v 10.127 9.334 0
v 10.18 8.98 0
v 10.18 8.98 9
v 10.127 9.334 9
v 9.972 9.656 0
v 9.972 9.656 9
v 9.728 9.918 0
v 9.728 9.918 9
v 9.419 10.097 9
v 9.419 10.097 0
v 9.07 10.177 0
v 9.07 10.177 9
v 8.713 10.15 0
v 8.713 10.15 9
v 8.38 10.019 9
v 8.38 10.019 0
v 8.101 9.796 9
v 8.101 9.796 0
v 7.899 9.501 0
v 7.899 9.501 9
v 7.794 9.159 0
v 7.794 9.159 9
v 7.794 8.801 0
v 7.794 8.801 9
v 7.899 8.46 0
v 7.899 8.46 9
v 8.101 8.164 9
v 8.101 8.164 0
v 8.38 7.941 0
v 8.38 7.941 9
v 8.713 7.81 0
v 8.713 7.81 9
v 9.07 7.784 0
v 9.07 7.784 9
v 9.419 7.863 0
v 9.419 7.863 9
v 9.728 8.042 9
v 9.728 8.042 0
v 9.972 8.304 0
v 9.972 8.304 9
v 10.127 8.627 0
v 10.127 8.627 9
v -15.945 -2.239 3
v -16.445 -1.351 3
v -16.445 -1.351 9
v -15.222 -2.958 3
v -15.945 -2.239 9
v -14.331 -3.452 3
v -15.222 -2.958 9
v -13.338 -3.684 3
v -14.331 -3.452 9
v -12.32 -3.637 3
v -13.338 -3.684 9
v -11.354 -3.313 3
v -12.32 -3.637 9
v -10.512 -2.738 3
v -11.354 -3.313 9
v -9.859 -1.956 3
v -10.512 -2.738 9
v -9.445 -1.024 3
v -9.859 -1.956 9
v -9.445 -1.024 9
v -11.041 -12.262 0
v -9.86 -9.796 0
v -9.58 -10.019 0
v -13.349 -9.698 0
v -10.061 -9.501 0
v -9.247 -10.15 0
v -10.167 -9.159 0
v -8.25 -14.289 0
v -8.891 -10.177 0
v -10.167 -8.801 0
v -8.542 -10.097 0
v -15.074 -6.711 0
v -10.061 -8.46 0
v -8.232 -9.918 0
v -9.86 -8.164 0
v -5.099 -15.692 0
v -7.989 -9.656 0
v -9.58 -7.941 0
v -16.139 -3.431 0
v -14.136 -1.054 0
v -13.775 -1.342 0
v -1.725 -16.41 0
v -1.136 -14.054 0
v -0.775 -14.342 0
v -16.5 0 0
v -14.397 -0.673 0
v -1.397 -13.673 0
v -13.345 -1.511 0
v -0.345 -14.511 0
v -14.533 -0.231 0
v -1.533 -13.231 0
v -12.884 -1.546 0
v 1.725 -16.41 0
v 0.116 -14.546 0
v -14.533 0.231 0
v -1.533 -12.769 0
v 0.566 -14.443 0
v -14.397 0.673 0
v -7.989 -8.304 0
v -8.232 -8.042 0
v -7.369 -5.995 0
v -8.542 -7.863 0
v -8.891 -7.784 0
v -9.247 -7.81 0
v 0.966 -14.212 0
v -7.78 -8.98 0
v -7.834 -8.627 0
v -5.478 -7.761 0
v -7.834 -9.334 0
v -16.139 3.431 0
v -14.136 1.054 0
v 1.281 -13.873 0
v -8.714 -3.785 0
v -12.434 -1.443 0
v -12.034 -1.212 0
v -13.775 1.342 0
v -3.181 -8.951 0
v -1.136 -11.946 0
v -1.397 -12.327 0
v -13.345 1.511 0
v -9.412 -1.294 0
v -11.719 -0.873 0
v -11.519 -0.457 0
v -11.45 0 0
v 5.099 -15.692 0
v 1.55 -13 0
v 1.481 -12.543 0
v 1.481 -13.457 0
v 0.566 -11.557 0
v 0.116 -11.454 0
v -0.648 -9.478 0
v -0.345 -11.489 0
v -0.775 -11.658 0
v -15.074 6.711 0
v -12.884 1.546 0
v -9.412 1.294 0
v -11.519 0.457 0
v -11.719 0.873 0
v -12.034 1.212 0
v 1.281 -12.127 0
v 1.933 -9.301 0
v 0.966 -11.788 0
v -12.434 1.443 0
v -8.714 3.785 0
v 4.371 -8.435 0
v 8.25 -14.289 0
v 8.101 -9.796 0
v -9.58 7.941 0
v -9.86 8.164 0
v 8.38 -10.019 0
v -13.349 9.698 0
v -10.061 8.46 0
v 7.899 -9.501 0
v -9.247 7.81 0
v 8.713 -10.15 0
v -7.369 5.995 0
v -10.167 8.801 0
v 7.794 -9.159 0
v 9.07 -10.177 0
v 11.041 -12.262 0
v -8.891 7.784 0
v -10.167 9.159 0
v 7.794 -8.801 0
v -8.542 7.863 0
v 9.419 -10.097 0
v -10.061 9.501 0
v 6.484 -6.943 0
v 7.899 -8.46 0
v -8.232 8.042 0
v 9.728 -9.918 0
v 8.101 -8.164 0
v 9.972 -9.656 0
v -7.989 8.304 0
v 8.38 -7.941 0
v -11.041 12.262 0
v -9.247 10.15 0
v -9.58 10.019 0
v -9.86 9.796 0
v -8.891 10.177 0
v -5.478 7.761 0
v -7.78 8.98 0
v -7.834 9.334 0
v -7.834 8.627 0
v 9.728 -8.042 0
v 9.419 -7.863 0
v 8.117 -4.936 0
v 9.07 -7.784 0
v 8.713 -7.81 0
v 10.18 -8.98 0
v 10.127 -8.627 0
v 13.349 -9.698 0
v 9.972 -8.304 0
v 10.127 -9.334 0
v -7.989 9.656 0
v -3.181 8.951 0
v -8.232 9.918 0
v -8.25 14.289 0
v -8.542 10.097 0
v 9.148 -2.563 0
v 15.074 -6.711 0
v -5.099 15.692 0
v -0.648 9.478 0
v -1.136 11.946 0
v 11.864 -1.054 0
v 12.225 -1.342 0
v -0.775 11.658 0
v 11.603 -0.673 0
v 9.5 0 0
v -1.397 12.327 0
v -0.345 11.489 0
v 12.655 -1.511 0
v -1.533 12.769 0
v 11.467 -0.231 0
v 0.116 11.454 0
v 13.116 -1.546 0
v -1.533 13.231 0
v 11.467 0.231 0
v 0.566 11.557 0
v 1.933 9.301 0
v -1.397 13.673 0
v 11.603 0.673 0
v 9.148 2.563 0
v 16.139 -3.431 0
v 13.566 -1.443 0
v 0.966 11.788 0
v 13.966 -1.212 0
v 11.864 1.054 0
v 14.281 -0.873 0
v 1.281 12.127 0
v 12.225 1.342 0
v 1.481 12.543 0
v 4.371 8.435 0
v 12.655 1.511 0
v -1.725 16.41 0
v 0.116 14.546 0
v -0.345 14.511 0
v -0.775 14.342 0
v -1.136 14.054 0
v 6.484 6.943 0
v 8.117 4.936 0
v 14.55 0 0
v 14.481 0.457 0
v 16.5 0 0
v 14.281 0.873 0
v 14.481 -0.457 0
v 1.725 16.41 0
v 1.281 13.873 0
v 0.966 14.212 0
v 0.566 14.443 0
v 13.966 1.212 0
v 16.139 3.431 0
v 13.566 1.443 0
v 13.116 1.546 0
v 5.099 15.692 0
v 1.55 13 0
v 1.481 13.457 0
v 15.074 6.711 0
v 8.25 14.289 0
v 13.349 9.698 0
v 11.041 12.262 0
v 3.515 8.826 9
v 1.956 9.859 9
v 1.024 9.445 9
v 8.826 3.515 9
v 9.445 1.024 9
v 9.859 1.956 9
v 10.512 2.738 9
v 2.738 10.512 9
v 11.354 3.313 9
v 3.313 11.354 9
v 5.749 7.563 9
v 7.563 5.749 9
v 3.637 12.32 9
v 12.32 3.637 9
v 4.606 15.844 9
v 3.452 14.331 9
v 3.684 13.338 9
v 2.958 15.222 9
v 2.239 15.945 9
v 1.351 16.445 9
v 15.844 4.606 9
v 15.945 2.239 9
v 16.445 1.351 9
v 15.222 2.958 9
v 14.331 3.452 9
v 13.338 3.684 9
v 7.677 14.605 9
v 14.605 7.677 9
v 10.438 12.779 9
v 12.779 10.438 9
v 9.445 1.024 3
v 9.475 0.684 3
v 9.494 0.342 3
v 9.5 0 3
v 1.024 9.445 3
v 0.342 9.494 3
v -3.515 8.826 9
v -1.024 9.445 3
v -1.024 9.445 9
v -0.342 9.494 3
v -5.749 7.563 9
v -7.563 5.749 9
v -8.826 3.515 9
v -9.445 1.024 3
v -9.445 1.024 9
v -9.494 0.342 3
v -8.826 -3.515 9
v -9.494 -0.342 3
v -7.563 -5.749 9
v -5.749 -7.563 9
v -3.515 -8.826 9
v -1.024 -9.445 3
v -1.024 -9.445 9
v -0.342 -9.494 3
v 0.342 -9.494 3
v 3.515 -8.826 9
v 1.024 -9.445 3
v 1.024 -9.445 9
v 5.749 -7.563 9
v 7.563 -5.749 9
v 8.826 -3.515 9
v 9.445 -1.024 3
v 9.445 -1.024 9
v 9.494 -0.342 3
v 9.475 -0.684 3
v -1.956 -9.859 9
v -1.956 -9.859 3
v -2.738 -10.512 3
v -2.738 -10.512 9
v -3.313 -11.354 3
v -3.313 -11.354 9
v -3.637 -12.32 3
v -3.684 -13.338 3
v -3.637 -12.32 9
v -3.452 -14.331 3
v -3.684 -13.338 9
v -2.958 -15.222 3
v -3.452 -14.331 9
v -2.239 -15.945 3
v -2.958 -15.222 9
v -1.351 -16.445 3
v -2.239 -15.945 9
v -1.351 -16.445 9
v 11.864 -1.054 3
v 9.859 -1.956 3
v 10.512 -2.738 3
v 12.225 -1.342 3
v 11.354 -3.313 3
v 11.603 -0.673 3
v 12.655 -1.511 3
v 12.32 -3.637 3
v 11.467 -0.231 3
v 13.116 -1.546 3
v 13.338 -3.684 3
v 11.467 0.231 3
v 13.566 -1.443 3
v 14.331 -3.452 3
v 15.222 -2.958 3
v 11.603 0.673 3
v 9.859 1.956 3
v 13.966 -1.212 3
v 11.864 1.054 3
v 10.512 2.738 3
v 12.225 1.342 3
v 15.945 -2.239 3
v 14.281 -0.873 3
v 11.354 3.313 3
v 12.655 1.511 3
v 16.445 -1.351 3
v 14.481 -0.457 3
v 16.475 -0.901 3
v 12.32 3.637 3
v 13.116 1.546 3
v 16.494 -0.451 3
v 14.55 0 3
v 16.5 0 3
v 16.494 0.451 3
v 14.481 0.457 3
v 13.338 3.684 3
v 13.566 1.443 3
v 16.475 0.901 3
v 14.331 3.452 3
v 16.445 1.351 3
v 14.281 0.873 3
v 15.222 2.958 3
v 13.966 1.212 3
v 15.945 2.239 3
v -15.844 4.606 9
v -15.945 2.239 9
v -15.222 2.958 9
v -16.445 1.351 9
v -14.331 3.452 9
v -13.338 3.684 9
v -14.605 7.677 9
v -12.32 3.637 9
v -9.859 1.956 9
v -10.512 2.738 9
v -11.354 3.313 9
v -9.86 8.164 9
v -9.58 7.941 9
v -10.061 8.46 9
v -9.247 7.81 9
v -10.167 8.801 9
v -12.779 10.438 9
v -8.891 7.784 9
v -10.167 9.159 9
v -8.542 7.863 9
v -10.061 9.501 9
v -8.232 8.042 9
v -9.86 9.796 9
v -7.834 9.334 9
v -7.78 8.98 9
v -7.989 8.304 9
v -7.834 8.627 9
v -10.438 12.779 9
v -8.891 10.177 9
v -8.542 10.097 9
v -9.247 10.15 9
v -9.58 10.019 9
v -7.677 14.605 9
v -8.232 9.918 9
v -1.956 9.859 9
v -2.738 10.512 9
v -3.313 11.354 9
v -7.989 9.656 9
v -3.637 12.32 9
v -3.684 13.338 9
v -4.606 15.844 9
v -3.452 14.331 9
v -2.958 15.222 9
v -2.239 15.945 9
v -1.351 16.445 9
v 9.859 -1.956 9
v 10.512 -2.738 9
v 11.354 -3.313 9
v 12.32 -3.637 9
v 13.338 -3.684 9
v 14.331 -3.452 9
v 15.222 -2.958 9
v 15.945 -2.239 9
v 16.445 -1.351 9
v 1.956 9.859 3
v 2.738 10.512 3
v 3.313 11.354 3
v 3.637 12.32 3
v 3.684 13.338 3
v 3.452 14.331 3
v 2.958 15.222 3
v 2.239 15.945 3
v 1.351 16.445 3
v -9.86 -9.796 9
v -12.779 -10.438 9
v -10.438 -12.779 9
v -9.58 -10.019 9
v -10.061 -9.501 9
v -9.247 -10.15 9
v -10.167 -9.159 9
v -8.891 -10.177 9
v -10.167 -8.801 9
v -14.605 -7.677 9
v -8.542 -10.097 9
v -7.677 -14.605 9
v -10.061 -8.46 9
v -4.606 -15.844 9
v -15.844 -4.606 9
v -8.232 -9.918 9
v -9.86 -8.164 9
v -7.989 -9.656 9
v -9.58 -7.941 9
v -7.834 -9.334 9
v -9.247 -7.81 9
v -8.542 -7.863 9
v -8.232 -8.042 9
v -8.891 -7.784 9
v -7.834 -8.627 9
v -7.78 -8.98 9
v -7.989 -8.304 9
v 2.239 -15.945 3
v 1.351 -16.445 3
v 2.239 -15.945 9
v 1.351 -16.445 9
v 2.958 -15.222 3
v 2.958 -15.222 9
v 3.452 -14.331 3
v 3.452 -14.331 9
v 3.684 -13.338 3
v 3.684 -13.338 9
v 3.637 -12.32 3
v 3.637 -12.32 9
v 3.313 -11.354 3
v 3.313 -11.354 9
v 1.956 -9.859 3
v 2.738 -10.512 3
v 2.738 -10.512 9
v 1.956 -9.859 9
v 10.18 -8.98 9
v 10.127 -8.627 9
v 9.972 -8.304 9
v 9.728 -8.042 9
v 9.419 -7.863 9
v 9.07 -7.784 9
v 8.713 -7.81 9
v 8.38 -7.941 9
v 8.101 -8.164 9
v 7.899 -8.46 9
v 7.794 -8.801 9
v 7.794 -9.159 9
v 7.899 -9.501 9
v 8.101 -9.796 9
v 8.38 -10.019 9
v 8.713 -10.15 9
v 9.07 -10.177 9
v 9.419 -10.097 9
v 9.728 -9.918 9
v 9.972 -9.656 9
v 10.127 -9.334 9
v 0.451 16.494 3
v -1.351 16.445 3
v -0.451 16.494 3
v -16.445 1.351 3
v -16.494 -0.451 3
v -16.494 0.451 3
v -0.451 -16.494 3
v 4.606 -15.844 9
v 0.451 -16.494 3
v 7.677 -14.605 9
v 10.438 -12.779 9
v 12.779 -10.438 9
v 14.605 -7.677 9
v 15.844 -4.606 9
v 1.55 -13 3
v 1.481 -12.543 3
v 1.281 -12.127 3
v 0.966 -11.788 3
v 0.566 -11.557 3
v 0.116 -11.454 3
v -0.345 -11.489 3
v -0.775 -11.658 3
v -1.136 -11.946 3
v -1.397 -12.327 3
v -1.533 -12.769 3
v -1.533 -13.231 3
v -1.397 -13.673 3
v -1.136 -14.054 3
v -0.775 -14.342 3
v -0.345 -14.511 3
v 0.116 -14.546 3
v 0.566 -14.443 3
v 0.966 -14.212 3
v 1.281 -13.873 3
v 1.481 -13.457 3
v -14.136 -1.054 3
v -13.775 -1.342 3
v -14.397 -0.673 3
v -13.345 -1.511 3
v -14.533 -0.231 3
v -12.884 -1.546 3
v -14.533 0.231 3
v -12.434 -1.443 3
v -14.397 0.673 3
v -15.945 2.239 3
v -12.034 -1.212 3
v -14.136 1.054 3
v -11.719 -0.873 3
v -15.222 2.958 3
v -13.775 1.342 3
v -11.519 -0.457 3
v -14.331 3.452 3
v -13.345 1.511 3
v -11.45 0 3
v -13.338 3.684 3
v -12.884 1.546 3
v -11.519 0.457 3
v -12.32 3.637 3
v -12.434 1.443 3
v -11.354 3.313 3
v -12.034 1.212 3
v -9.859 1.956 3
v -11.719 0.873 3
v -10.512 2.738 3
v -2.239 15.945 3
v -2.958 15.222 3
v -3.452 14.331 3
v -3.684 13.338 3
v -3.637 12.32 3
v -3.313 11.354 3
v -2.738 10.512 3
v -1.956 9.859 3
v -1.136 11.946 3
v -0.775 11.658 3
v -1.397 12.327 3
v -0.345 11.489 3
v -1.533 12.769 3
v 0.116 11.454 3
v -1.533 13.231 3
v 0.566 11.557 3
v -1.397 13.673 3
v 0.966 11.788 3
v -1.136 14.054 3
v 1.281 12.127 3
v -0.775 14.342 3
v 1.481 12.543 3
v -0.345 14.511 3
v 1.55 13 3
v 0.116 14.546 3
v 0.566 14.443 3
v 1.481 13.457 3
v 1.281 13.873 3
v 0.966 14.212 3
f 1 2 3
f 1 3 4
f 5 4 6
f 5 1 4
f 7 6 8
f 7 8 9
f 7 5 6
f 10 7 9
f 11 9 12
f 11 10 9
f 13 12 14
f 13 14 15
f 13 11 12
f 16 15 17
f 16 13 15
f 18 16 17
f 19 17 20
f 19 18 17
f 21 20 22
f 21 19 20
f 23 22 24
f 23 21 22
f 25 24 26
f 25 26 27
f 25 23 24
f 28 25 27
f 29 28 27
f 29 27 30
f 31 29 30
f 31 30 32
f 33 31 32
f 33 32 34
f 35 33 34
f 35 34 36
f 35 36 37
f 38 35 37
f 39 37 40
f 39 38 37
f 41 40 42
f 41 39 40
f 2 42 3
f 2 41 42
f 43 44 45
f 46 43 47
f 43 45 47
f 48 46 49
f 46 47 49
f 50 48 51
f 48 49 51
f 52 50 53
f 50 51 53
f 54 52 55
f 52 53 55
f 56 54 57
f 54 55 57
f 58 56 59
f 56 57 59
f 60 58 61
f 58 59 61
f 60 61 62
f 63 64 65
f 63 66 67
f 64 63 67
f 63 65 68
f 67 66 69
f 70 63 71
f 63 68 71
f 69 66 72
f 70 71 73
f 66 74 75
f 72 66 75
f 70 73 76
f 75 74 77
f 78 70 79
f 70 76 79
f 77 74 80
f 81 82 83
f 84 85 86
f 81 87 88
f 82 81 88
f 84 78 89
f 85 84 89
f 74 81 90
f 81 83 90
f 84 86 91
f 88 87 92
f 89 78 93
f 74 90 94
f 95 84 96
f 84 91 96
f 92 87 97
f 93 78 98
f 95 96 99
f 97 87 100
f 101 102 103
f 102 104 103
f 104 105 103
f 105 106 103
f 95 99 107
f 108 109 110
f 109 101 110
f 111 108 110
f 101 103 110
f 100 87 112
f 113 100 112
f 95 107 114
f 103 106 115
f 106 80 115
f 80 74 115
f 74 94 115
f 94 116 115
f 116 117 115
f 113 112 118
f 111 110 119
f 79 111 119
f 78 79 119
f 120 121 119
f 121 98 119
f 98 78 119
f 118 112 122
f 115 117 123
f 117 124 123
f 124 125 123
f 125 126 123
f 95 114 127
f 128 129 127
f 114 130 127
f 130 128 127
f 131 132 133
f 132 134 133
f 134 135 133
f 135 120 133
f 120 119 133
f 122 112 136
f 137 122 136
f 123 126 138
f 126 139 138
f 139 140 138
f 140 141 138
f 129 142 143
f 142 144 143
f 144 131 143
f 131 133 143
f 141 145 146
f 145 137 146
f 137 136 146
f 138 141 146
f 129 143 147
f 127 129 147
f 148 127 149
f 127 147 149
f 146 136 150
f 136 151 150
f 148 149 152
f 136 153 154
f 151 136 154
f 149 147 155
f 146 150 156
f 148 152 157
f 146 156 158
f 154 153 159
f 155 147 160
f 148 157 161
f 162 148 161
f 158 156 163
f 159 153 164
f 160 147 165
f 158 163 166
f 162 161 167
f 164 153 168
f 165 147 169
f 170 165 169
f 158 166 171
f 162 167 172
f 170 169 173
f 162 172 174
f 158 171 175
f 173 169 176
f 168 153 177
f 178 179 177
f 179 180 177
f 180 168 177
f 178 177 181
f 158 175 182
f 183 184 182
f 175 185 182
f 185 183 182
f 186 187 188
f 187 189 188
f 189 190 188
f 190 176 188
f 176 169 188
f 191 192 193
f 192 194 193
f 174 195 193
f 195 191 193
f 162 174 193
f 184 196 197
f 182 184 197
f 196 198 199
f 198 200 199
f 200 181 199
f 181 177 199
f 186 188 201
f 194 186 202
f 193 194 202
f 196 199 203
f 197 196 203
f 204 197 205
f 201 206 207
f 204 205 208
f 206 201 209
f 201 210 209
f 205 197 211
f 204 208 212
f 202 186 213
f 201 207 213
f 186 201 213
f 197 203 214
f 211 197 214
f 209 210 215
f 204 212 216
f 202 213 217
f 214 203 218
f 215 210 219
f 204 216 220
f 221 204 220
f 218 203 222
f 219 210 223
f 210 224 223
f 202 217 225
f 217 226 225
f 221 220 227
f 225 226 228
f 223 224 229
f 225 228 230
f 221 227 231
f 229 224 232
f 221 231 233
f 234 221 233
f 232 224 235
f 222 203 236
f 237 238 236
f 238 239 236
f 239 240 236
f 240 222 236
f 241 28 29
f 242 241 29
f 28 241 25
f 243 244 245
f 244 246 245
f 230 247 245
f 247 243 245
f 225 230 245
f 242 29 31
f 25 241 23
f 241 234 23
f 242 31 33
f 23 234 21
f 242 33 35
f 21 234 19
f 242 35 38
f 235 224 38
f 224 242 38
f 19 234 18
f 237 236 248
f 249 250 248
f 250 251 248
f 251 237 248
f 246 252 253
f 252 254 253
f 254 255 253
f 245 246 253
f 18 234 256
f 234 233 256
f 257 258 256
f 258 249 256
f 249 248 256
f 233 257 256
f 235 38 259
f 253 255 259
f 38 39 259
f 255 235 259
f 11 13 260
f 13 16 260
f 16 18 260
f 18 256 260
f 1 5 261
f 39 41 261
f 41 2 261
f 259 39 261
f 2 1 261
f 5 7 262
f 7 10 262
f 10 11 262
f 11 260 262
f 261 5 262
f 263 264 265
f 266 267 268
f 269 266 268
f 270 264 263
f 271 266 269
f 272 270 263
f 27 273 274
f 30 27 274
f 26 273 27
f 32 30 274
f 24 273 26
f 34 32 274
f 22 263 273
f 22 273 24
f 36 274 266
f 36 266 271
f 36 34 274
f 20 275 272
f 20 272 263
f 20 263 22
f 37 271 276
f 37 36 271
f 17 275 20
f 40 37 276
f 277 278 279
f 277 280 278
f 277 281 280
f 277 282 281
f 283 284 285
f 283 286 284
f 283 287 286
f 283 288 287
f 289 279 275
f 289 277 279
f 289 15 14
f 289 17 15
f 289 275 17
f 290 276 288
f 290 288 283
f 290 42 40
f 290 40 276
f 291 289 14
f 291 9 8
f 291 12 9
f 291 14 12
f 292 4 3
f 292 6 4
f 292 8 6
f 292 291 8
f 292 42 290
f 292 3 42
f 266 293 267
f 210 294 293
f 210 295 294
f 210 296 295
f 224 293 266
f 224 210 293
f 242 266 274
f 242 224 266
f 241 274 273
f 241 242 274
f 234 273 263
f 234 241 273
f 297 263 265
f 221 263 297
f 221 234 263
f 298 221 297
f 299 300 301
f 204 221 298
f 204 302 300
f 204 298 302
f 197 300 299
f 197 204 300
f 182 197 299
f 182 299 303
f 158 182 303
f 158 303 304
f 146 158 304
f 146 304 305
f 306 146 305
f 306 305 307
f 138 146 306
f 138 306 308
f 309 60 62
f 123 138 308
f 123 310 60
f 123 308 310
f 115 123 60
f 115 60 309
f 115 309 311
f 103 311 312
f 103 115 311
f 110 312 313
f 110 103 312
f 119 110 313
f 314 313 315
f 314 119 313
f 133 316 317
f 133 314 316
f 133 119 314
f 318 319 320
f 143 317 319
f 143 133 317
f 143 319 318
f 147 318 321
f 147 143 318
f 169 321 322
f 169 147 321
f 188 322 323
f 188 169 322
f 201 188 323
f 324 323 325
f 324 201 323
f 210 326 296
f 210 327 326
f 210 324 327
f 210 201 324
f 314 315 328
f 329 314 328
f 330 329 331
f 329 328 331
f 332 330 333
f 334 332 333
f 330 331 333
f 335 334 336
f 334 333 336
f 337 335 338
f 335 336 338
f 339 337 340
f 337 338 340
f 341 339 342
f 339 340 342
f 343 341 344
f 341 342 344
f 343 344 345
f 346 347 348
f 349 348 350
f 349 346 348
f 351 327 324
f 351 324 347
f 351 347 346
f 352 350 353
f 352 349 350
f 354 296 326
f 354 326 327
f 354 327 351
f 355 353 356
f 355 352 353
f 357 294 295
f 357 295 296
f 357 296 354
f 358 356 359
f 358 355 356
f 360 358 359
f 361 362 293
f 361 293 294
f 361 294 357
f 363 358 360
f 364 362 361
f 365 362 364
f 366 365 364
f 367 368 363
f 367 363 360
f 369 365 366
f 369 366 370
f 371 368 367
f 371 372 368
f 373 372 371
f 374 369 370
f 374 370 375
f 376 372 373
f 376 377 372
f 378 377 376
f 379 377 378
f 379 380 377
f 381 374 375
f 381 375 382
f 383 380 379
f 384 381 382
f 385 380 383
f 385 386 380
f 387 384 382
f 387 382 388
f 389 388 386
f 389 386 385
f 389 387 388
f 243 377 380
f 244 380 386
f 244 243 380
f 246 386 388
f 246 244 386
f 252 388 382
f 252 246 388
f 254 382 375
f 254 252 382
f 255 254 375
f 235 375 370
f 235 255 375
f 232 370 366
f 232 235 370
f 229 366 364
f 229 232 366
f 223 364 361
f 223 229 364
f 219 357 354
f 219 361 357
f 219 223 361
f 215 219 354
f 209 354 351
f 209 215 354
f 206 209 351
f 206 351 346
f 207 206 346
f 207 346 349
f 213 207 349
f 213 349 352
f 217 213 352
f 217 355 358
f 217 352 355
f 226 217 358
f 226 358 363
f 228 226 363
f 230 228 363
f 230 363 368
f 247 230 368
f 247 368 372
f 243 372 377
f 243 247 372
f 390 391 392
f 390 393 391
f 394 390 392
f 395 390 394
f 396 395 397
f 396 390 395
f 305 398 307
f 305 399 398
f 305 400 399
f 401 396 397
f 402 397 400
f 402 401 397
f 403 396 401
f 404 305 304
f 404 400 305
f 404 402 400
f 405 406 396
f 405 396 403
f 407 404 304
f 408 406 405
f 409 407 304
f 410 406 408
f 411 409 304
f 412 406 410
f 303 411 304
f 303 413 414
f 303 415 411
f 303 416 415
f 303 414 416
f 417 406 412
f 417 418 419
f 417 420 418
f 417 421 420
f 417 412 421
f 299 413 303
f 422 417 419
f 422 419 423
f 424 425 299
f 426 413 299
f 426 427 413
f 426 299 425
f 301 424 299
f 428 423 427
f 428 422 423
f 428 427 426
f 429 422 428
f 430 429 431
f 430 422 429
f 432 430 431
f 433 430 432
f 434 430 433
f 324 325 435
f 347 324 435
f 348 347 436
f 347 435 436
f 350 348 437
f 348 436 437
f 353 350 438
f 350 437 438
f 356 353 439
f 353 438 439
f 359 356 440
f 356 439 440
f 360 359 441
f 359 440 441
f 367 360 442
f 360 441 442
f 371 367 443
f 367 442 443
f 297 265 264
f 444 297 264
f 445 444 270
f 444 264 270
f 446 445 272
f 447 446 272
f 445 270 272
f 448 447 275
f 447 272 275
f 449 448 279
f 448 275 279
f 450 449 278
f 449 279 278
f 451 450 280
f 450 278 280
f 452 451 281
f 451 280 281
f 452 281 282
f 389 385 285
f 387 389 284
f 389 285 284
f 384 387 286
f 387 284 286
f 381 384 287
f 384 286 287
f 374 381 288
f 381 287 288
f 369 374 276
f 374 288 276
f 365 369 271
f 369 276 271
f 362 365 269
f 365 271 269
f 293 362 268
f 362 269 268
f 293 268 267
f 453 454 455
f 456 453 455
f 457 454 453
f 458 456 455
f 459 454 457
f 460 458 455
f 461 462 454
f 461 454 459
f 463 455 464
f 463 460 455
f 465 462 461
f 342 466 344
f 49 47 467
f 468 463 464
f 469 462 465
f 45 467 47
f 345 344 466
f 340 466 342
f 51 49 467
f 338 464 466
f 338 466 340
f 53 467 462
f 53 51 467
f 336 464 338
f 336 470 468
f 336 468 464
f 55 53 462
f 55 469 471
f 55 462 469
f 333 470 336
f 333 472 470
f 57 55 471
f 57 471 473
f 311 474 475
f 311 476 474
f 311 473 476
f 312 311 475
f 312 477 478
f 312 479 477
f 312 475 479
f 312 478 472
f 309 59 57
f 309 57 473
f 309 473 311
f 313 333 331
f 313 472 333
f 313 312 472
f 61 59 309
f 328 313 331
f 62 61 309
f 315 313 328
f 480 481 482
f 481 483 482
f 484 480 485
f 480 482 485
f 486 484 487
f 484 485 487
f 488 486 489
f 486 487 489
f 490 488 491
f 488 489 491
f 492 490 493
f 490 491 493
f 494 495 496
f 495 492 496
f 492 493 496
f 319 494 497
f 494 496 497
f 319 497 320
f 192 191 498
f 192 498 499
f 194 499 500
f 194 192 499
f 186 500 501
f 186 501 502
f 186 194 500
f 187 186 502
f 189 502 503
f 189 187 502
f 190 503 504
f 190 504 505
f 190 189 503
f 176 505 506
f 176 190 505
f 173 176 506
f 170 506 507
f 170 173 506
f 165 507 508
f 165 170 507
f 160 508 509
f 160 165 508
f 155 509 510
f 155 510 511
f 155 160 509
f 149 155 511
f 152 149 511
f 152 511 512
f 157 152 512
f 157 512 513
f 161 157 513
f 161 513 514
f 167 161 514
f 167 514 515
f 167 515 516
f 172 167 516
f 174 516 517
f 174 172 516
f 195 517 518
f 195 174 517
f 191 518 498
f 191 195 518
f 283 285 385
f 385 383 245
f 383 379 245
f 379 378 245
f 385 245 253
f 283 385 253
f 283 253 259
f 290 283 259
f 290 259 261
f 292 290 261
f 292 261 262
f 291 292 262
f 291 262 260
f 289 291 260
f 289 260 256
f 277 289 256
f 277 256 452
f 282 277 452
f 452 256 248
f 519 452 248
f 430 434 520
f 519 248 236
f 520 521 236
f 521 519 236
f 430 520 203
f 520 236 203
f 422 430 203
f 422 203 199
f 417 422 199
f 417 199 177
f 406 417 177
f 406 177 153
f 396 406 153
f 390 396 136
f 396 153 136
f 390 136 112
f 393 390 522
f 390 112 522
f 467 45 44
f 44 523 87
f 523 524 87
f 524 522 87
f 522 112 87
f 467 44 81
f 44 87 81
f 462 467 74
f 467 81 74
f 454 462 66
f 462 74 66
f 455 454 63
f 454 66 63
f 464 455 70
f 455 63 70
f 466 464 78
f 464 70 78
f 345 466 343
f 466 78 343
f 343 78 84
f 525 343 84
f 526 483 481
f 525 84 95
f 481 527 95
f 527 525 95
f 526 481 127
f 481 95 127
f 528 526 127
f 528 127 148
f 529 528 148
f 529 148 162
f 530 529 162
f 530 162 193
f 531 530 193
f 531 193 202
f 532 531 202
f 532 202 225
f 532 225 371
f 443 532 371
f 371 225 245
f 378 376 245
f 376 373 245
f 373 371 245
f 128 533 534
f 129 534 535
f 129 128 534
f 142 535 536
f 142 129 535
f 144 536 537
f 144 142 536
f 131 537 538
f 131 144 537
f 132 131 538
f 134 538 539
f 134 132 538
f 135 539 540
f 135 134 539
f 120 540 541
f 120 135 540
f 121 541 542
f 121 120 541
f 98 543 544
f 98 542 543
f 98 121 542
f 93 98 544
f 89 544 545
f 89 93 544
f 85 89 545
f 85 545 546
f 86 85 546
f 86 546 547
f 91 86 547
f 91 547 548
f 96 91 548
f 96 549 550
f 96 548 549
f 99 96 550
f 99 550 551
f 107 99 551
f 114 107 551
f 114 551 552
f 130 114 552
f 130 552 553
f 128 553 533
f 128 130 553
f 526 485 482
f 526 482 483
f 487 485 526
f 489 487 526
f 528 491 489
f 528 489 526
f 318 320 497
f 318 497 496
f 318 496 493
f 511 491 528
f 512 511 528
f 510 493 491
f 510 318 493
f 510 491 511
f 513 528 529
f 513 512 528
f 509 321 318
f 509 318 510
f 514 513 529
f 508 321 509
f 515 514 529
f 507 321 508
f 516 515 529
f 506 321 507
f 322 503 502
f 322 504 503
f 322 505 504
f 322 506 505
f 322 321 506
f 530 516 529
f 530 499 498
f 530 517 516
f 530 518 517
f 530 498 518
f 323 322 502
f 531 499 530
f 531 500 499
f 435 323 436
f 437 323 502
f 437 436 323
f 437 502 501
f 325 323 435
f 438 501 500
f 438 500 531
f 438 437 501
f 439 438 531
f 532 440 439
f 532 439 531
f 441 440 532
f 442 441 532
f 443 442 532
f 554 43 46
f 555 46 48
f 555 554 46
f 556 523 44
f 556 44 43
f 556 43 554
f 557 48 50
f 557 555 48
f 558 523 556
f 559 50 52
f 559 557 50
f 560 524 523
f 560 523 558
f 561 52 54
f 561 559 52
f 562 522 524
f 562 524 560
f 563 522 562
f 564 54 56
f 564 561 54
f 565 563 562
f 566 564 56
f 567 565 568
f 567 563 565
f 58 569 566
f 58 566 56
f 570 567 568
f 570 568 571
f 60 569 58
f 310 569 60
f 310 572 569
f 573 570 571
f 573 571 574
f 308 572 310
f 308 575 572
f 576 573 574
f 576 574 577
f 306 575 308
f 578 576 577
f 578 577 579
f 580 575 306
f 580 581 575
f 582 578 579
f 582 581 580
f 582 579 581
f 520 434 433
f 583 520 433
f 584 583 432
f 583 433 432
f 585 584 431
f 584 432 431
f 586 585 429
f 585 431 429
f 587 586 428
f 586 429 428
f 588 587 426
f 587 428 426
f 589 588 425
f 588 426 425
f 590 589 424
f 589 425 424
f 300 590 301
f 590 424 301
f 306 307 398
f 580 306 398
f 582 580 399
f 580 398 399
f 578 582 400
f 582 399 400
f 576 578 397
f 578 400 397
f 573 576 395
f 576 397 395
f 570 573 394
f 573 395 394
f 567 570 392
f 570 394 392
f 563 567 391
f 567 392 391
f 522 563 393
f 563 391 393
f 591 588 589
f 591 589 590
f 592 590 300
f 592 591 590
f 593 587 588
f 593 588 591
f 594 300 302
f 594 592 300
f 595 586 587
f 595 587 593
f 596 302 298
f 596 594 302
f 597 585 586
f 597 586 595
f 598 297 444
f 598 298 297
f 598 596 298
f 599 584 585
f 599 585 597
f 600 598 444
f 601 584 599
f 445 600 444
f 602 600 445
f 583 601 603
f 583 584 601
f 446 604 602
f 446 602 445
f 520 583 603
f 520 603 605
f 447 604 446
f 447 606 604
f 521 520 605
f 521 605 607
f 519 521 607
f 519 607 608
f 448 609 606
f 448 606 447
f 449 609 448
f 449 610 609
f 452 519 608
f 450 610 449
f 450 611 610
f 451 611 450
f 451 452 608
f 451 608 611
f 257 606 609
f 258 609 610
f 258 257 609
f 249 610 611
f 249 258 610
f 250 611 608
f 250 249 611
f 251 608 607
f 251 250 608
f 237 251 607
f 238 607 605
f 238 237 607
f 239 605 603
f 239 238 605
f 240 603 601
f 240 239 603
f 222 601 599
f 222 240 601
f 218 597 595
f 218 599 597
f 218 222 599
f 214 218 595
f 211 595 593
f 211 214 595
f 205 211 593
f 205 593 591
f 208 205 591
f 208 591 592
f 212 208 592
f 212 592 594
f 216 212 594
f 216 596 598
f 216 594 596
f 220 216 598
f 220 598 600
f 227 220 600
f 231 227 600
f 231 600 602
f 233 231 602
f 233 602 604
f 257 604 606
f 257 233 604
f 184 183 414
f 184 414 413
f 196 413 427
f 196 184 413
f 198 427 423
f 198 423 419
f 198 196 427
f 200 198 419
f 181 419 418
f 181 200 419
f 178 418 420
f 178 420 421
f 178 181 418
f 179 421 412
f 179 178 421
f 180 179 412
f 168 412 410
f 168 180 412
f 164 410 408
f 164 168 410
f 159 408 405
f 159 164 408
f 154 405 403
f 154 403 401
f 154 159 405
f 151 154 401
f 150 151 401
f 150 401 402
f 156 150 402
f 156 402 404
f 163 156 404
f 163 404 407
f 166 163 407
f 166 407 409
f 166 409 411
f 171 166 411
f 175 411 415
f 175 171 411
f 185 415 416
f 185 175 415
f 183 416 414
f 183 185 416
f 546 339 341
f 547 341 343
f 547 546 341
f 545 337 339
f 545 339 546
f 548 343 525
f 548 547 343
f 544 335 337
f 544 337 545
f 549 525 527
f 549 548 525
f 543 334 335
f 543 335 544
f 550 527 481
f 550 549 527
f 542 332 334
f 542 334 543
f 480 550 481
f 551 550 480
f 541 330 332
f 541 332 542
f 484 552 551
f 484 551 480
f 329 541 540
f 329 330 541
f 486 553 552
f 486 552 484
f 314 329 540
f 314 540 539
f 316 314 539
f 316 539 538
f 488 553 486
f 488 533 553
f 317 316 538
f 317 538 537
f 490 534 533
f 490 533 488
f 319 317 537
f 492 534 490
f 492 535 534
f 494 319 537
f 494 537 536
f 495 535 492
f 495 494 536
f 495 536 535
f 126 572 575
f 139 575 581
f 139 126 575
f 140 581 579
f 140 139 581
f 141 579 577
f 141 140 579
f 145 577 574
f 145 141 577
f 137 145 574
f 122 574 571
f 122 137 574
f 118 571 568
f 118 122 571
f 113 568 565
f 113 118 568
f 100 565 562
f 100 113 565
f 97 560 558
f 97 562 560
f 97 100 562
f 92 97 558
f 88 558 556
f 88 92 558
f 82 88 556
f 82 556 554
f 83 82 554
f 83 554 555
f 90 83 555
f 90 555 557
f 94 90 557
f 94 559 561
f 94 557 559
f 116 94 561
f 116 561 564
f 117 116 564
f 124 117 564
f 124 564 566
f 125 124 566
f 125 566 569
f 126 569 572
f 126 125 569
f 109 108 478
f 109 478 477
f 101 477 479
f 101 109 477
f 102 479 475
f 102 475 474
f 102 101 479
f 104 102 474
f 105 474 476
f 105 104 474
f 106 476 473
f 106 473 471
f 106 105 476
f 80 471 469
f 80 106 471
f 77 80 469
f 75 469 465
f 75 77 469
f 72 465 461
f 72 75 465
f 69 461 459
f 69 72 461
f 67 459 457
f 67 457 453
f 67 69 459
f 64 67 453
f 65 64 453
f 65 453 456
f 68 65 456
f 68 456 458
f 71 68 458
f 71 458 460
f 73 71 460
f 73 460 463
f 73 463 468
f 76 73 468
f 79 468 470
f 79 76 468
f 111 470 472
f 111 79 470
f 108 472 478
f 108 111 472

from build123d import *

# Parameters (mm, degrees)
SKETCH1_R           = 16.5
SKETCH1_R_2         = 1.2
SKETCH1_R_3         = 9.5
SKETCH1_R_4         = 1.55
BOSS_EXTRUDE1_DEPTH = 9
SKETCH2_R           = 3.7
CUT_EXTRUDE1_DEPTH  = 6


with BuildPart() as part:
    # Sketch1 → Boss-Extrude1 (new body)
    with BuildSketch(Plane.XY):
        Circle(SKETCH1_R)
        with Locations((8.980256121, 8.980256121)):
            Circle(SKETCH1_R_2, mode=Mode.SUBTRACT)
        with Locations((8.980256121, -8.980256121)):
            Circle(SKETCH1_R_2, mode=Mode.SUBTRACT)
        with Locations((-8.980256121, -8.980256121)):
            Circle(SKETCH1_R_2, mode=Mode.SUBTRACT)
        with Locations((-8.980256121, 8.980256121)):
            Circle(SKETCH1_R_2, mode=Mode.SUBTRACT)
        Circle(SKETCH1_R_3, mode=Mode.SUBTRACT)
        with Locations((0, 13)):
            Circle(SKETCH1_R_4, mode=Mode.SUBTRACT)
        with Locations((13, 0)):
            Circle(SKETCH1_R_4, mode=Mode.SUBTRACT)
        with Locations((0, -13)):
            Circle(SKETCH1_R_4, mode=Mode.SUBTRACT)
        with Locations((-13, 0)):
            Circle(SKETCH1_R_4, mode=Mode.SUBTRACT)
    extrude(amount=BOSS_EXTRUDE1_DEPTH)

    # Sketch2 → Cut-Extrude1 (cut)
    with BuildSketch(Plane.XY.offset(9)):
        with Locations((0, 13)):
            Circle(SKETCH2_R)
        with Locations((13, 0)):
            Circle(SKETCH2_R)
        with Locations((0, -13)):
            Circle(SKETCH2_R)
        with Locations((-13, 0)):
            Circle(SKETCH2_R)
    extrude(amount=-CUT_EXTRUDE1_DEPTH, mode=Mode.SUBTRACT)


solid = part.part
